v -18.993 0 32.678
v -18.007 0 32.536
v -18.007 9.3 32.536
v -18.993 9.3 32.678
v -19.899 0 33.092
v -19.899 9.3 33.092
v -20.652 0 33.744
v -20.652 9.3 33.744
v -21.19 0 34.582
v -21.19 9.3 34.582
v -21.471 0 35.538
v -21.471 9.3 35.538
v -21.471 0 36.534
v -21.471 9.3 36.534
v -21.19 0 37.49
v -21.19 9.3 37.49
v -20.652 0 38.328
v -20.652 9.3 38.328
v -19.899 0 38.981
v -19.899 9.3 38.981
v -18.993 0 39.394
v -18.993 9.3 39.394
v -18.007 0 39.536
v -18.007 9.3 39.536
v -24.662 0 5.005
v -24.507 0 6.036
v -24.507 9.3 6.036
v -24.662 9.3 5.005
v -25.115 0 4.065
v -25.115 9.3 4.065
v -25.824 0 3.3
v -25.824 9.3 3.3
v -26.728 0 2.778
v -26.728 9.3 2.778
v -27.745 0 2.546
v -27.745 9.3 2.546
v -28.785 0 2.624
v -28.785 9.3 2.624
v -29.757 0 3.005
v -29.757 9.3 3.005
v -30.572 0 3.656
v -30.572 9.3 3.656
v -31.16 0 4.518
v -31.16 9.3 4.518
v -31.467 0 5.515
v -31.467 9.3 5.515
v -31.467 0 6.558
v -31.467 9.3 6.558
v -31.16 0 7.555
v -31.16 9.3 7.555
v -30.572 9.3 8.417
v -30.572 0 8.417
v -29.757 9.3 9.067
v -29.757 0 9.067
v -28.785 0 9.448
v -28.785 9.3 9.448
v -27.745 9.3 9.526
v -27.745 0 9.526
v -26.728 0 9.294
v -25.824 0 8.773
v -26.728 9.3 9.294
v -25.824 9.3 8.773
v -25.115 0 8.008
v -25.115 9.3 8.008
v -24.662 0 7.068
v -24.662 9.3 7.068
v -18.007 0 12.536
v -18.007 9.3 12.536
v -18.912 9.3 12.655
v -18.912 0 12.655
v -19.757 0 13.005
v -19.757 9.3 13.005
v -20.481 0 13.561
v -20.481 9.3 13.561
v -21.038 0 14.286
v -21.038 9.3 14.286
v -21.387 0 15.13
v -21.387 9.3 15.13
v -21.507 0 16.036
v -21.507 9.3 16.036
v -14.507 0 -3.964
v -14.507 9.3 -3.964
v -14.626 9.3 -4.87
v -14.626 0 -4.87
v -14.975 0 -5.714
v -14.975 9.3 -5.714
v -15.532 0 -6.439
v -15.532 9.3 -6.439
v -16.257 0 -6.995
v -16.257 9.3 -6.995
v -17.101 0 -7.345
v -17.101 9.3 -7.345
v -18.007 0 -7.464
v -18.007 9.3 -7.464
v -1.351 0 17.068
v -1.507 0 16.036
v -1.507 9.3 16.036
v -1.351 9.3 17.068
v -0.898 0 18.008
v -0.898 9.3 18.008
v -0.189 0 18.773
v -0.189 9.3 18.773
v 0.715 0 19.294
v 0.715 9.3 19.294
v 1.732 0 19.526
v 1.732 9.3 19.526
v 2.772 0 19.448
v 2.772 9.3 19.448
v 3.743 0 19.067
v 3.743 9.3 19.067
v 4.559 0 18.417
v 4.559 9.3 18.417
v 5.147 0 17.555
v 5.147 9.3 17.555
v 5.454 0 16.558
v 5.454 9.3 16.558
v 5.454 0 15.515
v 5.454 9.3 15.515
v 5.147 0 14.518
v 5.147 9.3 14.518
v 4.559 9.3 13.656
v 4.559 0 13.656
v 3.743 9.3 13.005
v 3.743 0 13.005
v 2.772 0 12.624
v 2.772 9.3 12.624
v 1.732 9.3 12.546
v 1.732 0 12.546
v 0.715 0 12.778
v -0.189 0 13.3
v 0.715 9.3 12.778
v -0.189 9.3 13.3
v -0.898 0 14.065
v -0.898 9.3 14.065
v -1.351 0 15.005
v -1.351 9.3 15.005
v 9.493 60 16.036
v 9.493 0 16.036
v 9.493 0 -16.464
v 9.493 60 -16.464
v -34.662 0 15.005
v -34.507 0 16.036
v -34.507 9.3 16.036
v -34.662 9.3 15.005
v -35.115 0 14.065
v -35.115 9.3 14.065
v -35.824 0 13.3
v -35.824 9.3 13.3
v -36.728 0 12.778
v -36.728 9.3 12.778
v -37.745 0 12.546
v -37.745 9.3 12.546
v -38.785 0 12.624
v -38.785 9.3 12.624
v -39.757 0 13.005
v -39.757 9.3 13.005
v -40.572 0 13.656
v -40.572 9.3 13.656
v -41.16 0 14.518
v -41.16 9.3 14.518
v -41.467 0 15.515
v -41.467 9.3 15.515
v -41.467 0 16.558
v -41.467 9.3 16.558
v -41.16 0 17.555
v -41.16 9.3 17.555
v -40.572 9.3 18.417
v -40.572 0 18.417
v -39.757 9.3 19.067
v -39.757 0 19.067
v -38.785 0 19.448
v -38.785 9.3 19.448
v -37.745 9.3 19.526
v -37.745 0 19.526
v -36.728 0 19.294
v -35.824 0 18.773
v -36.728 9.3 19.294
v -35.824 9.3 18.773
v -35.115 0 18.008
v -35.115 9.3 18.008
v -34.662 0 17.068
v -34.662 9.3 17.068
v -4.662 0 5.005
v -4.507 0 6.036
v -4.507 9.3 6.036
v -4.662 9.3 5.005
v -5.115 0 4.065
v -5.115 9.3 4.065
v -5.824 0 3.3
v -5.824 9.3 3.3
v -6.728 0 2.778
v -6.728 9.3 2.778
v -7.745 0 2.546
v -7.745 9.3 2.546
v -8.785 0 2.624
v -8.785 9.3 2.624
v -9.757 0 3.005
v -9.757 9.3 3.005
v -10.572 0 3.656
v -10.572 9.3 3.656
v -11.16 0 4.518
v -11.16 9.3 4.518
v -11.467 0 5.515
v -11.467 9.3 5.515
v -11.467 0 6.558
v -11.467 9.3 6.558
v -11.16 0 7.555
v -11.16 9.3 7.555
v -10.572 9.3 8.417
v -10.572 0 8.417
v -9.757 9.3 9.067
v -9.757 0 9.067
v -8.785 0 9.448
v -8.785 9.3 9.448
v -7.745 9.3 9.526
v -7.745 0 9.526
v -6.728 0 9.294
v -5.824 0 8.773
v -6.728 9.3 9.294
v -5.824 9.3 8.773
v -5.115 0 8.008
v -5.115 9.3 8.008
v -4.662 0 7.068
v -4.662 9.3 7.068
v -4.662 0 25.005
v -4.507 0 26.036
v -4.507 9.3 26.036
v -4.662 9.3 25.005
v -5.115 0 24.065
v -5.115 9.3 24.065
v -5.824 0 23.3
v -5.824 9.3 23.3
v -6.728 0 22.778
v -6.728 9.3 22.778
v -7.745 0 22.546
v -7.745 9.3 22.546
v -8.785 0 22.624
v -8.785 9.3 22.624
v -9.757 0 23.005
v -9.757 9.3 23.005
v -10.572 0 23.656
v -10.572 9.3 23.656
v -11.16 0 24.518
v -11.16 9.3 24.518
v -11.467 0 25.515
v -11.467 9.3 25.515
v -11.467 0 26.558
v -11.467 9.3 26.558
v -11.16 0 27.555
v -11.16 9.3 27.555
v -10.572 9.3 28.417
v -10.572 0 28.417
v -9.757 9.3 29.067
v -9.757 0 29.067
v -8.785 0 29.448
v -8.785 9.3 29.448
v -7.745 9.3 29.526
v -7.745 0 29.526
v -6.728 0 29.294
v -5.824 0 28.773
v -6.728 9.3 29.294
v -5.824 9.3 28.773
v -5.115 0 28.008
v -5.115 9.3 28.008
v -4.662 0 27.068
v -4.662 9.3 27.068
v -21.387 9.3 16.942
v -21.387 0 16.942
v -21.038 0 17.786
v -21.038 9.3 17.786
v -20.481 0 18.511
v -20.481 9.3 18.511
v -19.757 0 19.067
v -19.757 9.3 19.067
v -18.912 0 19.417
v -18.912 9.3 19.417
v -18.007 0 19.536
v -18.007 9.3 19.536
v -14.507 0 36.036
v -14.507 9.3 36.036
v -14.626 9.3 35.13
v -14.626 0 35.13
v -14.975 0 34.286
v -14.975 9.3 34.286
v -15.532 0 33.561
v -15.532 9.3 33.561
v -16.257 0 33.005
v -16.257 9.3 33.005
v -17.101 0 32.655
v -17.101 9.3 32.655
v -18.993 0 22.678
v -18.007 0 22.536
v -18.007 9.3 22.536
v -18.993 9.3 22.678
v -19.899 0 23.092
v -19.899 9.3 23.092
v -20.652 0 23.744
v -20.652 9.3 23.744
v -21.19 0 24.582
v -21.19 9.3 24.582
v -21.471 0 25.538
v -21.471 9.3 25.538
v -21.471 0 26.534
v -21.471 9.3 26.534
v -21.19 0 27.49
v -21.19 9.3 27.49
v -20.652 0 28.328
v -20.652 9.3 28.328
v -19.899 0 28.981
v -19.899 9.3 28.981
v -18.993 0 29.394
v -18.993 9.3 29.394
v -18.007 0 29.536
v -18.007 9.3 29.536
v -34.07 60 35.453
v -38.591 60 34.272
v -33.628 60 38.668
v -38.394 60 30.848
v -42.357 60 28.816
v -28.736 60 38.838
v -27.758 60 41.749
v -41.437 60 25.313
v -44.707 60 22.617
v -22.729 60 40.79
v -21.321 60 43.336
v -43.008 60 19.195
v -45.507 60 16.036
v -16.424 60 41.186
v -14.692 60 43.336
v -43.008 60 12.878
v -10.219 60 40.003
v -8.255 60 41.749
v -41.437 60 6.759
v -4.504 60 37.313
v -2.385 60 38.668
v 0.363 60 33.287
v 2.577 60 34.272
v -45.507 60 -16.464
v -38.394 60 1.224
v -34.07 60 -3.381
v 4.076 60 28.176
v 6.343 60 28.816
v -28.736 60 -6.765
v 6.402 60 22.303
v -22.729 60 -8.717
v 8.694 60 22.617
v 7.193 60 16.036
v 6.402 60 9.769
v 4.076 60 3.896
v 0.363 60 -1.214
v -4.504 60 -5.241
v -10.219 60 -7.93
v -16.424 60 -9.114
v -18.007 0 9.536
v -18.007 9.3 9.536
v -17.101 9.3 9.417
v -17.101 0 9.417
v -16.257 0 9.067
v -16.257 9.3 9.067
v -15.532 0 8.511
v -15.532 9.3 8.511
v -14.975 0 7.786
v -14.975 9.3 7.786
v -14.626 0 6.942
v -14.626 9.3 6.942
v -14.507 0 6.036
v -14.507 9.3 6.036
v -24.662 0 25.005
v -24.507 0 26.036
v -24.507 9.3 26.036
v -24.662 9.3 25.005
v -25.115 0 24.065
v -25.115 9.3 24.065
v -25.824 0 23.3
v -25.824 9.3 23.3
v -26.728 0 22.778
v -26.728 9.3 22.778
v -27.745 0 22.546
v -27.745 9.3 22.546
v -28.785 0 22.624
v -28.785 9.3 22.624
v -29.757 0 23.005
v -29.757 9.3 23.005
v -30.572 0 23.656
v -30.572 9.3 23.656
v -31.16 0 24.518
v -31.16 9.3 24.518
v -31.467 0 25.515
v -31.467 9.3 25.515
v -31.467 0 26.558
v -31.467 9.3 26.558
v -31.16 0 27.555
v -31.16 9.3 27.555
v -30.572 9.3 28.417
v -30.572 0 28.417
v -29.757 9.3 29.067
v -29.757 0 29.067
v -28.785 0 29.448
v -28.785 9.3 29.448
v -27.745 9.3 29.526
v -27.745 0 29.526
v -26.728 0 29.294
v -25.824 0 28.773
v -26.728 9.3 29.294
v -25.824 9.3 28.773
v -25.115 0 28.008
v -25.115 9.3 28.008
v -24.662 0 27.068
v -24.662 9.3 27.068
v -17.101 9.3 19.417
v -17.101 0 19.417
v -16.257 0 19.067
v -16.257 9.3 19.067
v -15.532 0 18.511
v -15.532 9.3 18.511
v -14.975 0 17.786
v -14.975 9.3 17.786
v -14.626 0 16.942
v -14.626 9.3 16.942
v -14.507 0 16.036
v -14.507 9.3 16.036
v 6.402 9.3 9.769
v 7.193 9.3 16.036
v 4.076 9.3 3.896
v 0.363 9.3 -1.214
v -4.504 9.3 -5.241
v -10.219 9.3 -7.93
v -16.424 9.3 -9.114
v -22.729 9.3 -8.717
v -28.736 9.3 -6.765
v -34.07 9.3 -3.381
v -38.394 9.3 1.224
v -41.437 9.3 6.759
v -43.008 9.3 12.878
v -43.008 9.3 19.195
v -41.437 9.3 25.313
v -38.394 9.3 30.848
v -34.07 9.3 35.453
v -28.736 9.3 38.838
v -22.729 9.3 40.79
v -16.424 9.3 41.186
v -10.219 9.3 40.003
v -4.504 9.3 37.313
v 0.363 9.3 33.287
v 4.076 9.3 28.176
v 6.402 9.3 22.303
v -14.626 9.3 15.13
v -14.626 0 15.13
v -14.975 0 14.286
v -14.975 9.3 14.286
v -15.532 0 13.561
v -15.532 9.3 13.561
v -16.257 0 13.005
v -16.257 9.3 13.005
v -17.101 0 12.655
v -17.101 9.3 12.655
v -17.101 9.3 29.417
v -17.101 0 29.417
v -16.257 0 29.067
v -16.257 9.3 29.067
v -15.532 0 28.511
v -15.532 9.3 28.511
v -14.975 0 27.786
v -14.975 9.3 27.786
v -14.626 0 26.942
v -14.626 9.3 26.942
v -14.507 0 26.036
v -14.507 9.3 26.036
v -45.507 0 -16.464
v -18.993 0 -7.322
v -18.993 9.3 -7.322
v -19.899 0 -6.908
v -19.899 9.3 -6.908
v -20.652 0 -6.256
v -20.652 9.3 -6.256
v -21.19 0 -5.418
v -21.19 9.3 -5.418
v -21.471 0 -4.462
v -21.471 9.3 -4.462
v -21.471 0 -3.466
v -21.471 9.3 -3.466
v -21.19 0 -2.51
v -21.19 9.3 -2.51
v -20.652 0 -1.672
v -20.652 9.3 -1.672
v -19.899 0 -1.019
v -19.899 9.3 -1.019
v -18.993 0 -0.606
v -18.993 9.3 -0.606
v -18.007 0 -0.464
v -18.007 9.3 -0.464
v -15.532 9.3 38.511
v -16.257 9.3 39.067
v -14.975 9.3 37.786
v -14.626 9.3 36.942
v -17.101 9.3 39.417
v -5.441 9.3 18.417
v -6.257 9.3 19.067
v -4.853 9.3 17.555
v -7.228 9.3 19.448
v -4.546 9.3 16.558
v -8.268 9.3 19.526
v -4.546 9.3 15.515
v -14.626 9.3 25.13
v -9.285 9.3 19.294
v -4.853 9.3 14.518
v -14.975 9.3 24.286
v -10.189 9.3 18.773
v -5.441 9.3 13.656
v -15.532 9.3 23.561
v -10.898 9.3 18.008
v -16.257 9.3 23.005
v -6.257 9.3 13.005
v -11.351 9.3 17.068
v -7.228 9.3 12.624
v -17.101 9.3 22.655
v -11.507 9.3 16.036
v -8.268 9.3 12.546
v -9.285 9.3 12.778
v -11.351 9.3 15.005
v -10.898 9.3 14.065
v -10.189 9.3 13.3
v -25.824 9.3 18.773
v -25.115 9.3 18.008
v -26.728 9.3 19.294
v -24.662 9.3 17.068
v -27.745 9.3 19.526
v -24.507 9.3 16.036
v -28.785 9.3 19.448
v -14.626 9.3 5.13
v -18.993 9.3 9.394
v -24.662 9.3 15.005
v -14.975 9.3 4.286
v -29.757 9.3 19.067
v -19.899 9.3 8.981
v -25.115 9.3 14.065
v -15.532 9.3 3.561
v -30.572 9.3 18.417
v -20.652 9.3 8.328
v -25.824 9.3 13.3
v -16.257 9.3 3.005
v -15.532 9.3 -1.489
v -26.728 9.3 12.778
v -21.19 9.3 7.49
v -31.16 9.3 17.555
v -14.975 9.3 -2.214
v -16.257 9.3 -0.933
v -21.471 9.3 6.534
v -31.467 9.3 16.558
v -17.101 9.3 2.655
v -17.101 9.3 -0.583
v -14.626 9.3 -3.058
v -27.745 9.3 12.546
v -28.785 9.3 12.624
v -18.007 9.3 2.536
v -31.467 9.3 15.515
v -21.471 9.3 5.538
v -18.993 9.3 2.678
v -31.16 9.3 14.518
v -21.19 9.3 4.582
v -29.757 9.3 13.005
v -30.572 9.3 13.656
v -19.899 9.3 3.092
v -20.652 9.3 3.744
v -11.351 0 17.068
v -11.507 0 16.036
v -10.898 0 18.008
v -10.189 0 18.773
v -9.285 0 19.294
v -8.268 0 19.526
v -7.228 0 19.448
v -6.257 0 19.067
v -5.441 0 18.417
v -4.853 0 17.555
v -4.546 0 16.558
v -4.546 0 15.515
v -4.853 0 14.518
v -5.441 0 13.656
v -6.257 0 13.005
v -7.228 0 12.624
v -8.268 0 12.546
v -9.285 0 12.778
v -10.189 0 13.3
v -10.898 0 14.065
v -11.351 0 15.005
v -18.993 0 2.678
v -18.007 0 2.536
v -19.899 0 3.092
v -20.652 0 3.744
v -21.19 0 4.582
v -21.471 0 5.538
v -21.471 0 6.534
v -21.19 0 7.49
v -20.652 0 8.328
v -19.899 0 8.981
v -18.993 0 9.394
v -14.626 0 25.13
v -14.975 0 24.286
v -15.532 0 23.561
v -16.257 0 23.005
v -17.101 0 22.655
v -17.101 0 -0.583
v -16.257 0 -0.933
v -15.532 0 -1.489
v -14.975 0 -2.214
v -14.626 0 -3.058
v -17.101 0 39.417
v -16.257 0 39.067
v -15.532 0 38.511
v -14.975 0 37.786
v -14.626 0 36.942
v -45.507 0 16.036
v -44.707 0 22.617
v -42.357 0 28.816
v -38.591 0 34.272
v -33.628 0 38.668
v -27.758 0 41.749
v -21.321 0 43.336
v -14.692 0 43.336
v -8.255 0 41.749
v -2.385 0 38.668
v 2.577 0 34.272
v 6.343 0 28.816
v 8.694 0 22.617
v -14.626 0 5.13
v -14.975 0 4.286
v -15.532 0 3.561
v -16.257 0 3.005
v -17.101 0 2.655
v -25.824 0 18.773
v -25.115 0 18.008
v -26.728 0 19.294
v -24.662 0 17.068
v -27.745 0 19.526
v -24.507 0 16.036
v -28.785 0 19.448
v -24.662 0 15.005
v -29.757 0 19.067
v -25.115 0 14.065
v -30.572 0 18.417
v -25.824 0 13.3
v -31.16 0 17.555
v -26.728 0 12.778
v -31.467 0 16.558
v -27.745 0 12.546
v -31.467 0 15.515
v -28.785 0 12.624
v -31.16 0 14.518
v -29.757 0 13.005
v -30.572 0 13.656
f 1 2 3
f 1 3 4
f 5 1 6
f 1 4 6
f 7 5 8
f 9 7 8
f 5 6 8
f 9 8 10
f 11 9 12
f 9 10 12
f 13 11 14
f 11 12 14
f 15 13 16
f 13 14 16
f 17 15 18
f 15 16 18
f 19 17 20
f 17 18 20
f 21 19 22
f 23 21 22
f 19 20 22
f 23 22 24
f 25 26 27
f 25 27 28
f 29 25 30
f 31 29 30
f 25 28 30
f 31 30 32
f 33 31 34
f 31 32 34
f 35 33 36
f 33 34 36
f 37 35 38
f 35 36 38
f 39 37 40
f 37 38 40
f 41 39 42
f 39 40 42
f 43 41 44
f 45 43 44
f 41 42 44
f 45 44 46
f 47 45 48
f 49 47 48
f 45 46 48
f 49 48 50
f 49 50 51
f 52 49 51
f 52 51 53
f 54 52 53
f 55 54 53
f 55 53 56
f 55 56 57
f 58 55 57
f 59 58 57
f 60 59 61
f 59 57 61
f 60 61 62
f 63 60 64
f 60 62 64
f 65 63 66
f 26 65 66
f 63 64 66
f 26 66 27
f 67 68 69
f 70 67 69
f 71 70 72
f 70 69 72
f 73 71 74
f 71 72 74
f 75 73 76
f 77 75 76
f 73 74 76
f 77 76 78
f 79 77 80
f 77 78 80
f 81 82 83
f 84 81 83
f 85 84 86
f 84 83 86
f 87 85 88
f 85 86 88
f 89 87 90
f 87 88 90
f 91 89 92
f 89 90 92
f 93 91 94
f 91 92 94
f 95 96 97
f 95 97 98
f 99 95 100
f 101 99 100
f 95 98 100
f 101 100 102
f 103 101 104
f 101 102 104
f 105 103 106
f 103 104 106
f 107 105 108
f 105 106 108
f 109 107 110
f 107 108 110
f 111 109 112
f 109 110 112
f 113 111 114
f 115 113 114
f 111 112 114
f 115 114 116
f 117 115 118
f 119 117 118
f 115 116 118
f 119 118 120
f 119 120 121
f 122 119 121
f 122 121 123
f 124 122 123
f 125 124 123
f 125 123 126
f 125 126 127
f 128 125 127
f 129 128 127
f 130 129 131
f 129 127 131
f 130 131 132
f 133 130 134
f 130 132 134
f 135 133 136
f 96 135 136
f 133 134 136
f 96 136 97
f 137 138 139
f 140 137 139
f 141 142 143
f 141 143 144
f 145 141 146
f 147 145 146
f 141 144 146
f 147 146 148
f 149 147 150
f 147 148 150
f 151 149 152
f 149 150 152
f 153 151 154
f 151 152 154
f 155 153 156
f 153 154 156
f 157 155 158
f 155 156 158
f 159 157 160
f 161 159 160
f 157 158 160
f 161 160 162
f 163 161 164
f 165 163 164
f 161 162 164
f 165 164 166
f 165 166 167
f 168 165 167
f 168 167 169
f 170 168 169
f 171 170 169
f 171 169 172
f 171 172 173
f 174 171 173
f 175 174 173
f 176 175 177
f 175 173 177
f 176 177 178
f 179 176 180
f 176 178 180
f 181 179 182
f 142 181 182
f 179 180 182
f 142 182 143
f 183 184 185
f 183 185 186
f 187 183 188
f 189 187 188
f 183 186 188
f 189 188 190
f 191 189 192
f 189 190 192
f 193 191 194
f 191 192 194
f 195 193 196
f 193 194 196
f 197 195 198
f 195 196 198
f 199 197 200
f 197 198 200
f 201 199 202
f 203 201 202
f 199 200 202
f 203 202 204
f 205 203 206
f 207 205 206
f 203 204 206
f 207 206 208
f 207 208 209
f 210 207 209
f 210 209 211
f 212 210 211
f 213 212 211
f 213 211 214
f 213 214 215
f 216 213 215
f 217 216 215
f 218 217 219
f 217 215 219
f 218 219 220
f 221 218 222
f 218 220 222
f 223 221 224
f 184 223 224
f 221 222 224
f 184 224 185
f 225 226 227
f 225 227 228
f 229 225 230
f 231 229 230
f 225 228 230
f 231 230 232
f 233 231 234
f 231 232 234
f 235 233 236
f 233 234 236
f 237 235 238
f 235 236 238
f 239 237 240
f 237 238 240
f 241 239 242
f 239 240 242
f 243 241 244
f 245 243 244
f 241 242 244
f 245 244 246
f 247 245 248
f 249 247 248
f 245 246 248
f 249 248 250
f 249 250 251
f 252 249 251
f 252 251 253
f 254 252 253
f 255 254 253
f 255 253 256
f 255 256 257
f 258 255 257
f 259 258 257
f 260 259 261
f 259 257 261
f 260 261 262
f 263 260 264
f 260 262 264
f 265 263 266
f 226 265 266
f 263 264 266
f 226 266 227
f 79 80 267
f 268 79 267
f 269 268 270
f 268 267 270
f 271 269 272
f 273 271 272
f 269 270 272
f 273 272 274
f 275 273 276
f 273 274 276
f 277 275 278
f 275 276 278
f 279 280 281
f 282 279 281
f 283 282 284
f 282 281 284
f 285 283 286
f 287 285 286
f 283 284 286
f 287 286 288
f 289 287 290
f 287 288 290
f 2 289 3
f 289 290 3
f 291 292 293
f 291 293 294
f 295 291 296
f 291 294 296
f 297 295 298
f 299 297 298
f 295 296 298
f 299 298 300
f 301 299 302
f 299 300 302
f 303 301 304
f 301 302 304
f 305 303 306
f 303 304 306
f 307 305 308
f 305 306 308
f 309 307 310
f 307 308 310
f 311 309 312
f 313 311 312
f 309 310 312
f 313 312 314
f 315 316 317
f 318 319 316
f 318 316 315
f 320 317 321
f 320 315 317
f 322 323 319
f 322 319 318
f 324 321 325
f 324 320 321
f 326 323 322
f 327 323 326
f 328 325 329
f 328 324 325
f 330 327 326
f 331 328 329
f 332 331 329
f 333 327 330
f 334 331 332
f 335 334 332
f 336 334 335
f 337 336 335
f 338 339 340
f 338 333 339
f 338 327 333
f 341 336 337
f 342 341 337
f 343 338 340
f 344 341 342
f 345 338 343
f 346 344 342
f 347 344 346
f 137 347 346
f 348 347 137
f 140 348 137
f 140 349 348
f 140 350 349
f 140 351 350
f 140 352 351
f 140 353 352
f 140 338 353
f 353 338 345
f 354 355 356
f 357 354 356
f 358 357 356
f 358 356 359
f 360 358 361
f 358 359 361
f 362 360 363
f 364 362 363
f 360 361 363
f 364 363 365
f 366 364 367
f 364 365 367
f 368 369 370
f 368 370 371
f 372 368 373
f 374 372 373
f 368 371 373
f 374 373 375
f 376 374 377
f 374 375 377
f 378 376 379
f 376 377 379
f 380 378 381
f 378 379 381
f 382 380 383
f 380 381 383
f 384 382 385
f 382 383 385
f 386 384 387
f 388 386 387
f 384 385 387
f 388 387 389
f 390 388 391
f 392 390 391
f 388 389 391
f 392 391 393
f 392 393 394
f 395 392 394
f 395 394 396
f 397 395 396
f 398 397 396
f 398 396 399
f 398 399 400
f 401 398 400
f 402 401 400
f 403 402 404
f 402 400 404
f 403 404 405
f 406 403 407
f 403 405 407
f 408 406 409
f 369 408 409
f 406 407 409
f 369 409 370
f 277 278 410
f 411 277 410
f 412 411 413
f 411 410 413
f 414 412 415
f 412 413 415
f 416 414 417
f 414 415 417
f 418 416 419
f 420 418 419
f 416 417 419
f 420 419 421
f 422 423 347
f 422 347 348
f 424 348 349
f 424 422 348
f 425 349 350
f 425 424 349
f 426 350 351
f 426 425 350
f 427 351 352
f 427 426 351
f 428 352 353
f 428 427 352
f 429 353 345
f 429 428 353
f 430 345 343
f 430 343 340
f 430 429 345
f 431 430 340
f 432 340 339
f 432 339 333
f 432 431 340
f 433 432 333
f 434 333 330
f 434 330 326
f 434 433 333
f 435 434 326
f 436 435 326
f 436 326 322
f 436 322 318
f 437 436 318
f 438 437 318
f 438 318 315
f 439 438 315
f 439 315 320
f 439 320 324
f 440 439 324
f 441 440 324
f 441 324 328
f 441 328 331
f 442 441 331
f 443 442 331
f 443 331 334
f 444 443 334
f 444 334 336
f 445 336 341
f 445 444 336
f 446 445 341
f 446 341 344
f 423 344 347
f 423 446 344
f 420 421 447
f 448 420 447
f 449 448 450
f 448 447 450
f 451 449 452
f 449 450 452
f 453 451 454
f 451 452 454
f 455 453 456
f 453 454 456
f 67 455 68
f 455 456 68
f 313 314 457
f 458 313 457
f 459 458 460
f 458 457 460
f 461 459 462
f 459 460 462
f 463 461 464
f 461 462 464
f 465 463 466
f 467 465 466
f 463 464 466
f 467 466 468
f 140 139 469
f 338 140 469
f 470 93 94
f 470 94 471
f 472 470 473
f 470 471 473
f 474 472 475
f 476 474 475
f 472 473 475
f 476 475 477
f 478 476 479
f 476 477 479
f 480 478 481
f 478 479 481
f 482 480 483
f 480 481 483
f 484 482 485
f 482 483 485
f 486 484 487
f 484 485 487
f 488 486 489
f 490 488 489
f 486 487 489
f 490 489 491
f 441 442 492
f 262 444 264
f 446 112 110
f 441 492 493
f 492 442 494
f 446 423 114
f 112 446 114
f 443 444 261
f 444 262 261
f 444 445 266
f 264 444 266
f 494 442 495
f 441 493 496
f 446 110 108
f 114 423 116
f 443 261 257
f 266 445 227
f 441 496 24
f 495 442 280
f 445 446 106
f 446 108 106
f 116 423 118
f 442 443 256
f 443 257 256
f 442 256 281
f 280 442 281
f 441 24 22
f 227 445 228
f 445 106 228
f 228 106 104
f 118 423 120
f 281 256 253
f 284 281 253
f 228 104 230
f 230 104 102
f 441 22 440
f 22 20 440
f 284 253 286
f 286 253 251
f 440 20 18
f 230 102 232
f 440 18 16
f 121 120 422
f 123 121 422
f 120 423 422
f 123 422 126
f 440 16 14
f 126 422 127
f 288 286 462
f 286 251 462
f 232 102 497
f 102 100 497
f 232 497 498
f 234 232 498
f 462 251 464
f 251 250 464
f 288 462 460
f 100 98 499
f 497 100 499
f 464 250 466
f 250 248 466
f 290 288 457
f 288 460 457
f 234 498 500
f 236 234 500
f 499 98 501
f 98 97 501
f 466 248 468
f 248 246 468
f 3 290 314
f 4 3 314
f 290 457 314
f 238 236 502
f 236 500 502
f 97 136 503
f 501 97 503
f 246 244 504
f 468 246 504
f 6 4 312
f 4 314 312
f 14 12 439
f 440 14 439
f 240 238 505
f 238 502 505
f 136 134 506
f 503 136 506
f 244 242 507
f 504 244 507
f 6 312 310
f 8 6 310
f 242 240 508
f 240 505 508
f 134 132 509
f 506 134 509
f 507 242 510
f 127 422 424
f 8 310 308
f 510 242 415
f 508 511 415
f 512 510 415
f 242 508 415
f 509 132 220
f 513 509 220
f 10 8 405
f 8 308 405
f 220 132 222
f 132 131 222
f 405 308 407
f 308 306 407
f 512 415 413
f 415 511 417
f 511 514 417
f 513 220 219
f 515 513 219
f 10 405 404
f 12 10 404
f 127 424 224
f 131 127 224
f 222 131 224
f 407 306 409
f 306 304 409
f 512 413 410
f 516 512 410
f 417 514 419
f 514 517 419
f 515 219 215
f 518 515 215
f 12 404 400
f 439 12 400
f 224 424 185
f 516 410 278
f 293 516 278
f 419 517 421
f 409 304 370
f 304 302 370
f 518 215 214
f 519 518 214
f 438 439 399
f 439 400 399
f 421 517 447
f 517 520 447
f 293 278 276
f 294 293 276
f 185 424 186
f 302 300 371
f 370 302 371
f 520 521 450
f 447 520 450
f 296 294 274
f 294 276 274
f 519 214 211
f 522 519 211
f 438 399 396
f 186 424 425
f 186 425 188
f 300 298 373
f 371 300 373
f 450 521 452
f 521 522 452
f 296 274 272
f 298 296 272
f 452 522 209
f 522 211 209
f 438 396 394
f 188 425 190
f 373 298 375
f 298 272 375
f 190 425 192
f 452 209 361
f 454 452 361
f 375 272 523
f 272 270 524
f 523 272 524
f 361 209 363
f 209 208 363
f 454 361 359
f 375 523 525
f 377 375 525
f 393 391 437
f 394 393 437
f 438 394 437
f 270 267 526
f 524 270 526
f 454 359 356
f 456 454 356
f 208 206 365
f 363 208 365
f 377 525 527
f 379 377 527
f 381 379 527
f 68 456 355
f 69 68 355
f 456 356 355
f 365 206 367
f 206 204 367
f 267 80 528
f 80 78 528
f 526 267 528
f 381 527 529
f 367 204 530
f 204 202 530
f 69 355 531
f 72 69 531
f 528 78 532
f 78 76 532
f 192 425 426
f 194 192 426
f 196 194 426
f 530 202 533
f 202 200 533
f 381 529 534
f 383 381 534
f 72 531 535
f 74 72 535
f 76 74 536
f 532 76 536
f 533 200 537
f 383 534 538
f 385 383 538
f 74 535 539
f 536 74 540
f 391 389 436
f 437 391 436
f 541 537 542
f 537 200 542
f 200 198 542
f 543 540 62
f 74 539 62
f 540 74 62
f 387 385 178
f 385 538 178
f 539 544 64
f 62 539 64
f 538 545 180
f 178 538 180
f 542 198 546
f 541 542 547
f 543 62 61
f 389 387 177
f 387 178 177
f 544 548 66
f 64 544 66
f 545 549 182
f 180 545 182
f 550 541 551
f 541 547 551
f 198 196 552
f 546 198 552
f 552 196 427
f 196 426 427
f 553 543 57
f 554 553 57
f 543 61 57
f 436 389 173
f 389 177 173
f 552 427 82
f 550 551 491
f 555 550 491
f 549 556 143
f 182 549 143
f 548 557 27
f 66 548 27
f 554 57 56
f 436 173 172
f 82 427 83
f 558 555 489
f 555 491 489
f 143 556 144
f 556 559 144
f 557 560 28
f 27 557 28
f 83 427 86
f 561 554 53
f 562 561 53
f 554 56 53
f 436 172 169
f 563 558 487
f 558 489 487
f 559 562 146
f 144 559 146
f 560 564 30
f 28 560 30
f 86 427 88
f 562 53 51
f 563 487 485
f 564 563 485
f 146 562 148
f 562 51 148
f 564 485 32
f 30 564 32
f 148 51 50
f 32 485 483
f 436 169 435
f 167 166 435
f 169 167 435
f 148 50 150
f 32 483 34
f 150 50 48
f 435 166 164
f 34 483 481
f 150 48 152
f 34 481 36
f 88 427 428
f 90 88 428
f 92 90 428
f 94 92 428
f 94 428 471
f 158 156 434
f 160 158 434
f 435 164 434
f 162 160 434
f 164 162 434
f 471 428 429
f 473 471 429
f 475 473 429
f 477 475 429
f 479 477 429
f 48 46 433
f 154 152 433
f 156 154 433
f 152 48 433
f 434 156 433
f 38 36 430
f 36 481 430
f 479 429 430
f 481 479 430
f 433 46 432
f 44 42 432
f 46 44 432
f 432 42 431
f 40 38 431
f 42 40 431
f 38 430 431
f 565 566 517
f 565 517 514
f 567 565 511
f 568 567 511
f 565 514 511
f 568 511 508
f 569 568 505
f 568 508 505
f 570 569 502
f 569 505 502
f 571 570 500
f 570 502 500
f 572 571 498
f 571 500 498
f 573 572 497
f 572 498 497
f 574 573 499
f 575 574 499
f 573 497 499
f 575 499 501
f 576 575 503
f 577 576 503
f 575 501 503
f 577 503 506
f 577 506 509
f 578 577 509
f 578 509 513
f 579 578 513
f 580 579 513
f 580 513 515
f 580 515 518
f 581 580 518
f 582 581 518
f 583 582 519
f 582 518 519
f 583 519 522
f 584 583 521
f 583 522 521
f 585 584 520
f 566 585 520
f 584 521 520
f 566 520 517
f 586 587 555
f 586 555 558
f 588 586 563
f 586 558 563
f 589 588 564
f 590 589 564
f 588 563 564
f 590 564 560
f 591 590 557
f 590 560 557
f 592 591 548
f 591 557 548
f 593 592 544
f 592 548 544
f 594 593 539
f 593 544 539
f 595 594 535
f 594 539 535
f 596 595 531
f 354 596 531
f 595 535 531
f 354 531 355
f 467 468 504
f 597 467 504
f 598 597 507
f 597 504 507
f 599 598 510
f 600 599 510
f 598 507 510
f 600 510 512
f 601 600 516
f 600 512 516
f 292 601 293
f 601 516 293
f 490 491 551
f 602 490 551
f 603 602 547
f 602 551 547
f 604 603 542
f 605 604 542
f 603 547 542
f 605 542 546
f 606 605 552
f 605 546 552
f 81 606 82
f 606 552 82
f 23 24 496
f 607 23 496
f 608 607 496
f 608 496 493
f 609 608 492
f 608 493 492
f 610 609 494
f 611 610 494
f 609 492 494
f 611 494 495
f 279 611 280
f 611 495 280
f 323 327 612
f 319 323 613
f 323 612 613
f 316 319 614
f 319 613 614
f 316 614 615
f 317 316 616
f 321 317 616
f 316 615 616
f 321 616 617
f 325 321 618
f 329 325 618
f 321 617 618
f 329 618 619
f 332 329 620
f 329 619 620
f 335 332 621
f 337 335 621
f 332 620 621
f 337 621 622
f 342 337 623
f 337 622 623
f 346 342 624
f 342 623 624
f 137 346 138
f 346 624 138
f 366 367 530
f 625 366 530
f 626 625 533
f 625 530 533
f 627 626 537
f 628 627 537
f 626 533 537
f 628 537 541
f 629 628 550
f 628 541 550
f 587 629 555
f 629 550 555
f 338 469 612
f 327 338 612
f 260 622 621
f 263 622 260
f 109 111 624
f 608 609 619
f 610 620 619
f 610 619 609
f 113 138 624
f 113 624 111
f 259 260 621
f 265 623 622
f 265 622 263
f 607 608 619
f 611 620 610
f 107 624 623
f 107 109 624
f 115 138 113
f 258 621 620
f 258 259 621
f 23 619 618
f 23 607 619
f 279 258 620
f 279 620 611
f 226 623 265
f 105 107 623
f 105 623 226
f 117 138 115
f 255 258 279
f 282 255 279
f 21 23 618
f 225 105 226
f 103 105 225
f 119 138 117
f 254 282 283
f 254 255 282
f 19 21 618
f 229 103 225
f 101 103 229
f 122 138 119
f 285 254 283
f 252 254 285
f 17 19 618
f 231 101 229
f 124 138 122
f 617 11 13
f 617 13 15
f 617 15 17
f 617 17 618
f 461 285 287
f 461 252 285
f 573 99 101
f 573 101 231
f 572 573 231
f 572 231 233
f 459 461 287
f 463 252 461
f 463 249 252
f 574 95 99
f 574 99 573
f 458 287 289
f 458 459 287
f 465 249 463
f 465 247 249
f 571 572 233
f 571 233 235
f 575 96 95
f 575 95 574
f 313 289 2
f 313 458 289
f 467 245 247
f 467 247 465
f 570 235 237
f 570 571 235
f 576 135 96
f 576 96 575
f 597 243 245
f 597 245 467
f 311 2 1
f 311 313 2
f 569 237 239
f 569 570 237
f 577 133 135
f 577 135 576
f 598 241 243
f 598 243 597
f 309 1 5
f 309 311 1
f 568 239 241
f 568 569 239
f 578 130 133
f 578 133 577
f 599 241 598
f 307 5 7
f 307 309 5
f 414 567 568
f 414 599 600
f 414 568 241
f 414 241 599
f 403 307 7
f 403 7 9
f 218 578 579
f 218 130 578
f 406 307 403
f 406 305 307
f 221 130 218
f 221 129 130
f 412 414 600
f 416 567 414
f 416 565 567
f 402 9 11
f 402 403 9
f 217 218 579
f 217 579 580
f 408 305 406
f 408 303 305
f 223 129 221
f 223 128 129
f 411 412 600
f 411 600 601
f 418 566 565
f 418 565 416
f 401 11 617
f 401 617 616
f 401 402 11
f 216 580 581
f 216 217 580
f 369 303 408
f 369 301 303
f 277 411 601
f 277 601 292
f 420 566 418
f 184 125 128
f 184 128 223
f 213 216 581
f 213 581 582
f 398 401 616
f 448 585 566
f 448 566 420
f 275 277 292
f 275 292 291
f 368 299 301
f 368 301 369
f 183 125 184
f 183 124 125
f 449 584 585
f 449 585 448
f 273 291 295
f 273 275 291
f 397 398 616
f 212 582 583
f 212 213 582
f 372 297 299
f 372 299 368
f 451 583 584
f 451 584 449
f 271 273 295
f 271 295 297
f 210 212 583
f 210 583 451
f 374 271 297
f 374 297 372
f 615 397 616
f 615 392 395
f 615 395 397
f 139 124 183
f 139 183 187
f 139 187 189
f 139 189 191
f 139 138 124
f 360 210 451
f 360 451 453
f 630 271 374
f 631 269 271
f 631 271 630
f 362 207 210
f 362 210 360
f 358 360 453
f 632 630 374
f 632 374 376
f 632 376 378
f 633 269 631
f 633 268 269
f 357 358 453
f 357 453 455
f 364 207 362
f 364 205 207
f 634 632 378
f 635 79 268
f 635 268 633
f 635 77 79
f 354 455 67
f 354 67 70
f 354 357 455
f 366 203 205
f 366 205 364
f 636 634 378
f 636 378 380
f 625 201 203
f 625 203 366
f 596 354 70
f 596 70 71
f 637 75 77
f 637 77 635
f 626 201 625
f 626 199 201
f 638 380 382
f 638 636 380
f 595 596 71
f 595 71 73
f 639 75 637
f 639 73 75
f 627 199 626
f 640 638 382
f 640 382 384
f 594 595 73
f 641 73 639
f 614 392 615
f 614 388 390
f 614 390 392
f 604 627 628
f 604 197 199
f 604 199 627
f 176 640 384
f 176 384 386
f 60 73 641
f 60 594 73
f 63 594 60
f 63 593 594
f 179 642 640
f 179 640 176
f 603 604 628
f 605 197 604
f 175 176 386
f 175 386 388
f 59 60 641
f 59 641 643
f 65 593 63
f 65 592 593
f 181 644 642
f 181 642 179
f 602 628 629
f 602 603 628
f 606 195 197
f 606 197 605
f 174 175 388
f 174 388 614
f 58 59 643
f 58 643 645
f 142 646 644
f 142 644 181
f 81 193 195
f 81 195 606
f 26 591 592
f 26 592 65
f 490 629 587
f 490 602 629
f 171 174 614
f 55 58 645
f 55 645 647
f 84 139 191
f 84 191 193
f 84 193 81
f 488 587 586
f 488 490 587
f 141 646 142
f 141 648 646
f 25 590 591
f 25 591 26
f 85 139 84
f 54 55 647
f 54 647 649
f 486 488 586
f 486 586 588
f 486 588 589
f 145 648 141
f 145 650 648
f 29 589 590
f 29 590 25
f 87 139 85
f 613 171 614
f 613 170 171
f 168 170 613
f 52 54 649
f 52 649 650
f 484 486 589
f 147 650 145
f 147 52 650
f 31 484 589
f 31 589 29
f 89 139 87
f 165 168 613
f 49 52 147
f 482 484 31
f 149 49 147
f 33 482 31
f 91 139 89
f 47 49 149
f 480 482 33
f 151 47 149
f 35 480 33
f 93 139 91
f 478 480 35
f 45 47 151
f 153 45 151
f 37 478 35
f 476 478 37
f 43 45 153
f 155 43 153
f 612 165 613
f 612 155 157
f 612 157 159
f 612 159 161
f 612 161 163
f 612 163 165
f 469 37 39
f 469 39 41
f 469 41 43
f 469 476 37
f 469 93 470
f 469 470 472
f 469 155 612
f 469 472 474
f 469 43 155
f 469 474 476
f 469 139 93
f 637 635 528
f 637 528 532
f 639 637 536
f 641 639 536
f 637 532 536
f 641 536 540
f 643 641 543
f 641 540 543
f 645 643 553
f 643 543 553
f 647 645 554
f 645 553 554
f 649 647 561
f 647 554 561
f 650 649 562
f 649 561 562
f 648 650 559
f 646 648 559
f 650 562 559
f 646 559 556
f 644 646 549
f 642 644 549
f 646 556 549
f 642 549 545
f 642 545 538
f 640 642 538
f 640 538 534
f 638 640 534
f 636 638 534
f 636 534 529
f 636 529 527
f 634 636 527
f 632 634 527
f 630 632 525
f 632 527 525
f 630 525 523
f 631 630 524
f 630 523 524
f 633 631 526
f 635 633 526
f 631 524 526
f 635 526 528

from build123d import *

# Parameters (mm, degrees)
SKETCH1_R           = 25.2
BOSS_EXTRUDE2_DEPTH = 60
SKETCH3_R           = 25.2
BOSS_EXTRUDE3_DEPTH = 9.3
SKETCH4_R           = 3.5
CUT_EXTRUDE1_DEPTH  = 9.3


with BuildPart() as part:
    # Sketch1 → Boss-Extrude2 (new body)
    with BuildSketch(Plane(origin=(0, 0, 0), x_dir=(1, 0, 0), z_dir=(0, 1, 0))):
        with BuildLine():
            Line((9.493421053, 16.463815789), (-45.506578947, 16.463815789))
            Line((-45.506578947, 16.463815789), (-45.506578947, -16.036184211))
            ThreePointArc((-45.506578947, -16.036184211), (-18.006578947, -43.536184211), (9.493421053, -16.036184211))
            Line((9.493421053, -16.036184211), (9.493421053, 16.463815789))
        make_face()
        with Locations((-18.006578947, -16.036184211)):
            Circle(SKETCH1_R, mode=Mode.SUBTRACT)
    extrude(amount=BOSS_EXTRUDE2_DEPTH)

    # Sketch3 → Boss-Extrude3 (add)
    with BuildSketch(Plane(origin=(0, 0, 0), x_dir=(-1, 0, 0), z_dir=(0, -1, 0))):
        with Locations((18.006578947, -16.036184211)):
            Circle(SKETCH3_R)
    extrude(amount=-BOSS_EXTRUDE3_DEPTH)

    # Sketch4 → Cut-Extrude1 (cut)
    with BuildSketch(Plane(origin=(0, 9.3, 0), x_dir=(1, 0, 0), z_dir=(0, 1, 0))):
        with BuildLine():
            ThreePointArc((-18.006578947, 7.463815789), (-21.506578947, 3.963815789), (-18.006578947, 0.463815789))
            Line((-18.006578947, 0.463815789), (-18.006578947, 7.463815789))
        make_face()
        with BuildLine():
            Line((-18.006578947, 7.463815789), (-18.006578947, 0.463815789))
            ThreePointArc((-18.006578947, 0.463815789), (-15.531705213, 1.488942055), (-14.506578947, 3.963815789))
            ThreePointArc((-14.506578947, 3.963815789), (-15.531705213, 6.438689524), (-18.006578947, 7.463815789))
        make_face()
        with BuildLine():
            ThreePointArc((-18.006578947, -2.536184211), (-21.506578947, -6.036184211), (-18.006578947, -9.536184211))
            Line((-18.006578947, -9.536184211), (-18.006578947, -2.536184211))
        make_face()
        with BuildLine():
            Line((-18.006578947, -2.536184211), (-18.006578947, -9.536184211))
            ThreePointArc((-18.006578947, -9.536184211), (-15.531705213, -8.511057945), (-14.506578947, -6.036184211))
            ThreePointArc((-14.506578947, -6.036184211), (-15.531705213, -3.561310476), (-18.006578947, -2.536184211))
        make_face()
        with Locations((-28.006578947, -6.036184211)):
            Circle(SKETCH4_R)
        with Locations((-8.006578947, -6.036184211)):
            Circle(SKETCH4_R)
        with BuildLine():
            ThreePointArc((-4.506578947, -16.036184211), (-8.006578947, -12.536184211), (-11.506578947, -16.036184211))
            Line((-11.506578947, -16.036184211), (-4.506578947, -16.036184211))
        make_face()
        with BuildLine():
            Line((-4.506578947, -16.036184211), (-11.506578947, -16.036184211))
            ThreePointArc((-11.506578947, -16.036184211), (-8.006578947, -19.536184211), (-4.506578947, -16.036184211))
        make_face()
        with BuildLine():
            ThreePointArc((5.493421053, -16.036184211), (1.993421053, -12.536184211), (-1.506578947, -16.036184211))
            Line((-1.506578947, -16.036184211), (5.493421053, -16.036184211))
        make_face()
        with BuildLine():
            Line((5.493421053, -16.036184211), (-1.506578947, -16.036184211))
            ThreePointArc((-1.506578947, -16.036184211), (1.993421053, -19.536184211), (5.493421053, -16.036184211))
        make_face()
        with BuildLine():
            ThreePointArc((-21.506578947, -16.036184211), (-20.481452682, -18.511057945), (-18.006578947, -19.536184211))
            Line((-18.006578947, -19.536184211), (-18.006578947, -16.036184211))
            Line((-18.006578947, -16.036184211), (-21.506578947, -16.036184211))
        make_face()
        with BuildLine():
            Line((-18.006578947, -16.036184211), (-18.006578947, -19.536184211))
            ThreePointArc((-18.006578947, -19.536184211), (-15.531705213, -18.511057945), (-14.506578947, -16.036184211))
            Line((-14.506578947, -16.036184211), (-18.006578947, -16.036184211))
        make_face()
        with BuildLine():
            Line((-21.506578947, -16.036184211), (-18.006578947, -16.036184211))
            Line((-18.006578947, -16.036184211), (-18.006578947, -12.536184211))
            ThreePointArc((-18.006578947, -12.536184211), (-20.481452682, -13.561310476), (-21.506578947, -16.036184211))
        make_face()
        with BuildLine():
            Line((-18.006578947, -12.536184211), (-18.006578947, -16.036184211))
            Line((-18.006578947, -16.036184211), (-14.506578947, -16.036184211))
            ThreePointArc((-14.506578947, -16.036184211), (-15.531705213, -13.561310476), (-18.006578947, -12.536184211))
        make_face()
        with BuildLine():
            ThreePointArc((-41.506578947, -16.036184211), (-38.006578947, -19.536184211), (-34.506578947, -16.036184211))
            Line((-34.506578947, -16.036184211), (-41.506578947, -16.036184211))
        make_face()
        with BuildLine():
            Line((-41.506578947, -16.036184211), (-34.506578947, -16.036184211))
            ThreePointArc((-34.506578947, -16.036184211), (-38.006578947, -12.536184211), (-41.506578947, -16.036184211))
        make_face()
        with Locations((-28.006578947, -26.036184211)):
            Circle(SKETCH4_R)
        with BuildLine():
            ThreePointArc((-18.006578947, -22.536184211), (-21.506578947, -26.036184211), (-18.006578947, -29.536184211))
            Line((-18.006578947, -29.536184211), (-18.006578947, -22.536184211))
        make_face()
        with BuildLine():
            Line((-18.006578947, -22.536184211), (-18.006578947, -29.536184211))
            ThreePointArc((-18.006578947, -29.536184211), (-15.531705213, -28.511057945), (-14.506578947, -26.036184211))
            ThreePointArc((-14.506578947, -26.036184211), (-15.531705213, -23.561310476), (-18.006578947, -22.536184211))
        make_face()
        with Locations((-8.006578947, -26.036184211)):
            Circle(SKETCH4_R)
        with BuildLine():
            ThreePointArc((-18.006578947, -32.536184211), (-21.506578947, -36.036184211), (-18.006578947, -39.536184211))
            Line((-18.006578947, -39.536184211), (-18.006578947, -32.536184211))
        make_face()
        with BuildLine():
            Line((-18.006578947, -32.536184211), (-18.006578947, -39.536184211))
            ThreePointArc((-18.006578947, -39.536184211), (-15.531705213, -38.511057945), (-14.506578947, -36.036184211))
            ThreePointArc((-14.506578947, -36.036184211), (-15.531705213, -33.561310476), (-18.006578947, -32.536184211))
        make_face()
        with BuildLine():
            ThreePointArc((-31.506578947, -16.036184211), (-28.006578947, -19.536184211), (-24.506578947, -16.036184211))
            Line((-24.506578947, -16.036184211), (-31.506578947, -16.036184211))
        make_face()
        with BuildLine():
            Line((-31.506578947, -16.036184211), (-24.506578947, -16.036184211))
            ThreePointArc((-24.506578947, -16.036184211), (-28.006578947, -12.536184211), (-31.506578947, -16.036184211))
        make_face()
    extrude(amount=-CUT_EXTRUDE1_DEPTH, mode=Mode.SUBTRACT)


solid = part.part
